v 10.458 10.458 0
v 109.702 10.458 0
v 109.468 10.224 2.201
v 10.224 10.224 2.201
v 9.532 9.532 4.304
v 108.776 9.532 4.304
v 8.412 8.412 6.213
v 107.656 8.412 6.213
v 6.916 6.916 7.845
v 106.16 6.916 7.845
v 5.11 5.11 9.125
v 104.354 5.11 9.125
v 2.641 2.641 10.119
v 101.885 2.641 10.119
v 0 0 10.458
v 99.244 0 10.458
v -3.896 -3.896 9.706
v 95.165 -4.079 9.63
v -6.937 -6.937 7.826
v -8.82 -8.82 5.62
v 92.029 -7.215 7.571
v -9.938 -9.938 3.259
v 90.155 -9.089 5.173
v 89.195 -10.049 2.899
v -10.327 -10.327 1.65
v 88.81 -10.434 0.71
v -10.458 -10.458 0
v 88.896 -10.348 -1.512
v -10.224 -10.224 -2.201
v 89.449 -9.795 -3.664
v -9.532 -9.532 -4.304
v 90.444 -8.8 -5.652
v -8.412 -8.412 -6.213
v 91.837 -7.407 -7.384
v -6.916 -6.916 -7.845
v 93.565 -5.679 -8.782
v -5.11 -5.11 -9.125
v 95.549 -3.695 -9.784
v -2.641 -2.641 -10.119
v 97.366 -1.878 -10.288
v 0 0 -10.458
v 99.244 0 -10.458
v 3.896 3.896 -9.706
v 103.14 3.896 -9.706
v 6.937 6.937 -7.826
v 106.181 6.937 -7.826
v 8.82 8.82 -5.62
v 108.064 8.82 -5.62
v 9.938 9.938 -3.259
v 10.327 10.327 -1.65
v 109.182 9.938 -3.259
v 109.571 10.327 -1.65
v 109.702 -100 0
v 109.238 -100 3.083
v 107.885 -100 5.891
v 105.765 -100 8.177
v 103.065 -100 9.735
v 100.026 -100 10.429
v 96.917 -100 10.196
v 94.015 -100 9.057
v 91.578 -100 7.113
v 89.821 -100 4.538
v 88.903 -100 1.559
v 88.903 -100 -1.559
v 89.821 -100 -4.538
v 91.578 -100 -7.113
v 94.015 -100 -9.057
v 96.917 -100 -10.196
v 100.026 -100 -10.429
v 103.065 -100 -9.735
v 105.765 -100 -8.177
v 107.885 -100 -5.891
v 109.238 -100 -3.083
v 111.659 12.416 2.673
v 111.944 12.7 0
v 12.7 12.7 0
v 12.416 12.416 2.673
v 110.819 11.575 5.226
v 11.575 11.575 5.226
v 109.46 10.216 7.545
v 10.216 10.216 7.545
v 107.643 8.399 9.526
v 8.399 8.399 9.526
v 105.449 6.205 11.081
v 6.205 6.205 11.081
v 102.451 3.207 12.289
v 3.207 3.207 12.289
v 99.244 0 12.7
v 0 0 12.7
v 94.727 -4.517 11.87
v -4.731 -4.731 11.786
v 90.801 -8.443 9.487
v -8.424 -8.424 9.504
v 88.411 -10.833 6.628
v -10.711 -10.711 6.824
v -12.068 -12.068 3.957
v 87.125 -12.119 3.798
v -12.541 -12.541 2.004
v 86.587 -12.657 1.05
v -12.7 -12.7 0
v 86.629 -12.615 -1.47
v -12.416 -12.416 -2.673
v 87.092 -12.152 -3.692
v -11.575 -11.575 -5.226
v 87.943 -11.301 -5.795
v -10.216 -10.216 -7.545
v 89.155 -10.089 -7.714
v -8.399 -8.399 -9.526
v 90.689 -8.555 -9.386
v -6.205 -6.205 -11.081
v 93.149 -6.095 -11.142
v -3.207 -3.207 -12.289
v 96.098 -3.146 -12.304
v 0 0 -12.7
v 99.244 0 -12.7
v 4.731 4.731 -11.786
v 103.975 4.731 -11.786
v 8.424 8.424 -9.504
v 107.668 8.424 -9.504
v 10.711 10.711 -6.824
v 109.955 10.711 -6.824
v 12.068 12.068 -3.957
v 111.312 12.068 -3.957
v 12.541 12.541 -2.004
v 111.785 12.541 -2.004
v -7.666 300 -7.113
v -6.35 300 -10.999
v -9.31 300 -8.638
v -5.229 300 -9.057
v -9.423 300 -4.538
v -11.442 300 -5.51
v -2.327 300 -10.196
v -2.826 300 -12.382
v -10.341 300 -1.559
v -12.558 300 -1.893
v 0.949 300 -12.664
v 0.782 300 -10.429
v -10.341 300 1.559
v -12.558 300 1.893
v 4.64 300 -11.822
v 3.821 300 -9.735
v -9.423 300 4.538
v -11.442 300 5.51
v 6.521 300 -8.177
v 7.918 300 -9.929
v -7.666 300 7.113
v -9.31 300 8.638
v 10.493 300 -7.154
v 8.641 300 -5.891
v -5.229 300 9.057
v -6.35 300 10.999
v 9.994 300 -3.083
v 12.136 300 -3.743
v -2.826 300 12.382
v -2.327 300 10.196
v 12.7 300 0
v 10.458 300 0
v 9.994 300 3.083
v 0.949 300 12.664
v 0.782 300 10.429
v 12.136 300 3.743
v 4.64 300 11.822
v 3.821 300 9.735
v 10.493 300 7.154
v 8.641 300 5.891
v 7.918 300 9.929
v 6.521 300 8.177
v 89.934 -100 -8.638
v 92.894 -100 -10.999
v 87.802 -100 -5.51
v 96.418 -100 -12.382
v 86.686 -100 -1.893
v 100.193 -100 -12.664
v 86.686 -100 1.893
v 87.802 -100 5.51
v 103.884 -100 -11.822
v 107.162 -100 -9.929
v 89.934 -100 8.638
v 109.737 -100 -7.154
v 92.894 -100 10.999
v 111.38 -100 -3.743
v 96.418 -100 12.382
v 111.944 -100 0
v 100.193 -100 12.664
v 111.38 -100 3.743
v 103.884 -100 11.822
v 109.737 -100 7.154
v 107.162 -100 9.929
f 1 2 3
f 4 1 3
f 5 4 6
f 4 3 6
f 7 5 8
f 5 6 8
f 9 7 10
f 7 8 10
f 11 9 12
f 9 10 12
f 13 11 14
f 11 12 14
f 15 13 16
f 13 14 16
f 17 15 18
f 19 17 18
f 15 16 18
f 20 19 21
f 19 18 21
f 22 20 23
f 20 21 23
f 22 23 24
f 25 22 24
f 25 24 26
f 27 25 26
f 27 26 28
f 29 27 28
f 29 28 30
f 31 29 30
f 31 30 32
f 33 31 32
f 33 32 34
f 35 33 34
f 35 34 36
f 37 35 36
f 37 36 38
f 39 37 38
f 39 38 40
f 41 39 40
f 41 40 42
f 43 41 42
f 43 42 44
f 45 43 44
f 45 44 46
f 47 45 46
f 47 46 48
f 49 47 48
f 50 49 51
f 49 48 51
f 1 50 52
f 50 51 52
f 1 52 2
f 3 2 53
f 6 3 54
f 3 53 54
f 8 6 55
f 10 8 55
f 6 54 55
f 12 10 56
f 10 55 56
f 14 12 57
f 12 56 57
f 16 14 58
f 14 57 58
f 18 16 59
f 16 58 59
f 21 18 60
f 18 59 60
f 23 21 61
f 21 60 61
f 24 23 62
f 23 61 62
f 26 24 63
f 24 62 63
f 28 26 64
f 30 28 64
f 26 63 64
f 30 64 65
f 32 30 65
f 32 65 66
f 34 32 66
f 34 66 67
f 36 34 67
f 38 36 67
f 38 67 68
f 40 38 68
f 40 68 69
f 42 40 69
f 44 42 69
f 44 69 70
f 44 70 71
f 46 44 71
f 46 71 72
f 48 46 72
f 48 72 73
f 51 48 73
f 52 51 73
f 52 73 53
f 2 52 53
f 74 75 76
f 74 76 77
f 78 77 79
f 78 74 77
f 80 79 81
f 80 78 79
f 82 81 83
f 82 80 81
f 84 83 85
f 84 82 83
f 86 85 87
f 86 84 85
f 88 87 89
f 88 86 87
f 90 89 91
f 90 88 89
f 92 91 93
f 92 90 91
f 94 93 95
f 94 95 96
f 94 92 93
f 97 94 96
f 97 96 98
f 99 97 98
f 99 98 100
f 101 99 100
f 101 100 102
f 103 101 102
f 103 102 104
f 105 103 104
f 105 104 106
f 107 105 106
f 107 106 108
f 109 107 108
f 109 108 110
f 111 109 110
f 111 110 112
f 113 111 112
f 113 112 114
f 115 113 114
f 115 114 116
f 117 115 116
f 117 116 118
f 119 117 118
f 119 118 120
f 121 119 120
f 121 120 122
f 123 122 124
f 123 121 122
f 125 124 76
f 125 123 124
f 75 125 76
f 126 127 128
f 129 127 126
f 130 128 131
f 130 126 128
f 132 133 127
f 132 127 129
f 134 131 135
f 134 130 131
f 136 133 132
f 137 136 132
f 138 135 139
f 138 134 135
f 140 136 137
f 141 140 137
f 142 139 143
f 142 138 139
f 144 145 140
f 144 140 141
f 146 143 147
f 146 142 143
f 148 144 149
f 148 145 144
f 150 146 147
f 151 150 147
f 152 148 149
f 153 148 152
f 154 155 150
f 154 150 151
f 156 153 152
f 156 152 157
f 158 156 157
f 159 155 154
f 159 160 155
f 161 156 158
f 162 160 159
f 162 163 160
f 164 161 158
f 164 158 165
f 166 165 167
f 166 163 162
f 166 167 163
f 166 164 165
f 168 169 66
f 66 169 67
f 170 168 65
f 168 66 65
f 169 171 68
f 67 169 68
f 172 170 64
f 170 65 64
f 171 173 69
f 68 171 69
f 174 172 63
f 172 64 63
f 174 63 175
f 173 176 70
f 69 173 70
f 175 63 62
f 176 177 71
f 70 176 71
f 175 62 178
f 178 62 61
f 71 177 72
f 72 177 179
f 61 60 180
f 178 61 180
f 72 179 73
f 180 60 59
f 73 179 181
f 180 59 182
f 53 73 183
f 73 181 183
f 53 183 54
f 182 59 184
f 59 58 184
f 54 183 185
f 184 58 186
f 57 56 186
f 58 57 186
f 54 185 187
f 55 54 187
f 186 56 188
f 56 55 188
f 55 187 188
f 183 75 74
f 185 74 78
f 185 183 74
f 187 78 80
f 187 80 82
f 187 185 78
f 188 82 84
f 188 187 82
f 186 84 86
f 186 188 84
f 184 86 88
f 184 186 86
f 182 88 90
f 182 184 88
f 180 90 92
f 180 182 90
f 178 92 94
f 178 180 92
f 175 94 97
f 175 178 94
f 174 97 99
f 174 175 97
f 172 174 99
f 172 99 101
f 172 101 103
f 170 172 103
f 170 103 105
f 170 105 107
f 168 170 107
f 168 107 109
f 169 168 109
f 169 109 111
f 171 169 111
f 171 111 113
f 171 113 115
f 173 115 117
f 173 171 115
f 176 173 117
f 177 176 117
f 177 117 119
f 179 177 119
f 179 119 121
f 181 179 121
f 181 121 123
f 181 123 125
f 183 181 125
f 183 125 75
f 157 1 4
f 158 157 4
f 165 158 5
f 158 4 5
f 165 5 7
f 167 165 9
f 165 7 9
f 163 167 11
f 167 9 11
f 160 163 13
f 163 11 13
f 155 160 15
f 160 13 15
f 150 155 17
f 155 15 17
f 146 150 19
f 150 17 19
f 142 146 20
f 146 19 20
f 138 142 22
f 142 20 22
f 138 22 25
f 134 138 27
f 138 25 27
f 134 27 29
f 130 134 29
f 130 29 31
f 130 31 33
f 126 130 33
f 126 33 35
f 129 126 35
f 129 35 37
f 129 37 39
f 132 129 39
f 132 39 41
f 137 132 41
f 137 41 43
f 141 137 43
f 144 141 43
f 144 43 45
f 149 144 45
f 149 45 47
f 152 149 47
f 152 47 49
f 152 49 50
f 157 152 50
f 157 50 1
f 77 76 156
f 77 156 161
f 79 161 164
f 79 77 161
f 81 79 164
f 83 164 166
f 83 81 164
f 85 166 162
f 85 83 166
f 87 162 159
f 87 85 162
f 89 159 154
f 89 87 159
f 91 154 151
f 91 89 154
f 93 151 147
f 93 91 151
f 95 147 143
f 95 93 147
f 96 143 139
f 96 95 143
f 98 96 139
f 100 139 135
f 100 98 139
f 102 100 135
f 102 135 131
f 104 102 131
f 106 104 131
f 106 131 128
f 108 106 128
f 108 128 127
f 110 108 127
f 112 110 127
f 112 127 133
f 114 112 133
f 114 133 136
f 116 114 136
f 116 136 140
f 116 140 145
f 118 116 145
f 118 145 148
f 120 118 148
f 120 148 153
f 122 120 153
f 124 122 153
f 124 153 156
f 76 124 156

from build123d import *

# Parameters (mm, degrees)
SKETCH2_R   = 12.7
SKETCH2_R_2 = 10.458255758


with BuildPart() as part:
    # Sweep1: sweep along a path in Sketch1
    with BuildLine(Plane.XY) as sweep1_path:
        Line((0, 300), (0, 0))
        Line((0, 0), (99.24397827, 0))
        Line((99.24397827, 0), (99.24397827, -100))
    # Sketch2 → Sweep1 (sweep)
    with BuildSketch(Plane(origin=(0, 300, 0), x_dir=(1, 0, 0), z_dir=(0, 1, 0))):
        Circle(SKETCH2_R)
        Circle(SKETCH2_R_2, mode=Mode.SUBTRACT)
    sweep(path=sweep1_path.line, transition=Transition.RIGHT)


solid = part.part
